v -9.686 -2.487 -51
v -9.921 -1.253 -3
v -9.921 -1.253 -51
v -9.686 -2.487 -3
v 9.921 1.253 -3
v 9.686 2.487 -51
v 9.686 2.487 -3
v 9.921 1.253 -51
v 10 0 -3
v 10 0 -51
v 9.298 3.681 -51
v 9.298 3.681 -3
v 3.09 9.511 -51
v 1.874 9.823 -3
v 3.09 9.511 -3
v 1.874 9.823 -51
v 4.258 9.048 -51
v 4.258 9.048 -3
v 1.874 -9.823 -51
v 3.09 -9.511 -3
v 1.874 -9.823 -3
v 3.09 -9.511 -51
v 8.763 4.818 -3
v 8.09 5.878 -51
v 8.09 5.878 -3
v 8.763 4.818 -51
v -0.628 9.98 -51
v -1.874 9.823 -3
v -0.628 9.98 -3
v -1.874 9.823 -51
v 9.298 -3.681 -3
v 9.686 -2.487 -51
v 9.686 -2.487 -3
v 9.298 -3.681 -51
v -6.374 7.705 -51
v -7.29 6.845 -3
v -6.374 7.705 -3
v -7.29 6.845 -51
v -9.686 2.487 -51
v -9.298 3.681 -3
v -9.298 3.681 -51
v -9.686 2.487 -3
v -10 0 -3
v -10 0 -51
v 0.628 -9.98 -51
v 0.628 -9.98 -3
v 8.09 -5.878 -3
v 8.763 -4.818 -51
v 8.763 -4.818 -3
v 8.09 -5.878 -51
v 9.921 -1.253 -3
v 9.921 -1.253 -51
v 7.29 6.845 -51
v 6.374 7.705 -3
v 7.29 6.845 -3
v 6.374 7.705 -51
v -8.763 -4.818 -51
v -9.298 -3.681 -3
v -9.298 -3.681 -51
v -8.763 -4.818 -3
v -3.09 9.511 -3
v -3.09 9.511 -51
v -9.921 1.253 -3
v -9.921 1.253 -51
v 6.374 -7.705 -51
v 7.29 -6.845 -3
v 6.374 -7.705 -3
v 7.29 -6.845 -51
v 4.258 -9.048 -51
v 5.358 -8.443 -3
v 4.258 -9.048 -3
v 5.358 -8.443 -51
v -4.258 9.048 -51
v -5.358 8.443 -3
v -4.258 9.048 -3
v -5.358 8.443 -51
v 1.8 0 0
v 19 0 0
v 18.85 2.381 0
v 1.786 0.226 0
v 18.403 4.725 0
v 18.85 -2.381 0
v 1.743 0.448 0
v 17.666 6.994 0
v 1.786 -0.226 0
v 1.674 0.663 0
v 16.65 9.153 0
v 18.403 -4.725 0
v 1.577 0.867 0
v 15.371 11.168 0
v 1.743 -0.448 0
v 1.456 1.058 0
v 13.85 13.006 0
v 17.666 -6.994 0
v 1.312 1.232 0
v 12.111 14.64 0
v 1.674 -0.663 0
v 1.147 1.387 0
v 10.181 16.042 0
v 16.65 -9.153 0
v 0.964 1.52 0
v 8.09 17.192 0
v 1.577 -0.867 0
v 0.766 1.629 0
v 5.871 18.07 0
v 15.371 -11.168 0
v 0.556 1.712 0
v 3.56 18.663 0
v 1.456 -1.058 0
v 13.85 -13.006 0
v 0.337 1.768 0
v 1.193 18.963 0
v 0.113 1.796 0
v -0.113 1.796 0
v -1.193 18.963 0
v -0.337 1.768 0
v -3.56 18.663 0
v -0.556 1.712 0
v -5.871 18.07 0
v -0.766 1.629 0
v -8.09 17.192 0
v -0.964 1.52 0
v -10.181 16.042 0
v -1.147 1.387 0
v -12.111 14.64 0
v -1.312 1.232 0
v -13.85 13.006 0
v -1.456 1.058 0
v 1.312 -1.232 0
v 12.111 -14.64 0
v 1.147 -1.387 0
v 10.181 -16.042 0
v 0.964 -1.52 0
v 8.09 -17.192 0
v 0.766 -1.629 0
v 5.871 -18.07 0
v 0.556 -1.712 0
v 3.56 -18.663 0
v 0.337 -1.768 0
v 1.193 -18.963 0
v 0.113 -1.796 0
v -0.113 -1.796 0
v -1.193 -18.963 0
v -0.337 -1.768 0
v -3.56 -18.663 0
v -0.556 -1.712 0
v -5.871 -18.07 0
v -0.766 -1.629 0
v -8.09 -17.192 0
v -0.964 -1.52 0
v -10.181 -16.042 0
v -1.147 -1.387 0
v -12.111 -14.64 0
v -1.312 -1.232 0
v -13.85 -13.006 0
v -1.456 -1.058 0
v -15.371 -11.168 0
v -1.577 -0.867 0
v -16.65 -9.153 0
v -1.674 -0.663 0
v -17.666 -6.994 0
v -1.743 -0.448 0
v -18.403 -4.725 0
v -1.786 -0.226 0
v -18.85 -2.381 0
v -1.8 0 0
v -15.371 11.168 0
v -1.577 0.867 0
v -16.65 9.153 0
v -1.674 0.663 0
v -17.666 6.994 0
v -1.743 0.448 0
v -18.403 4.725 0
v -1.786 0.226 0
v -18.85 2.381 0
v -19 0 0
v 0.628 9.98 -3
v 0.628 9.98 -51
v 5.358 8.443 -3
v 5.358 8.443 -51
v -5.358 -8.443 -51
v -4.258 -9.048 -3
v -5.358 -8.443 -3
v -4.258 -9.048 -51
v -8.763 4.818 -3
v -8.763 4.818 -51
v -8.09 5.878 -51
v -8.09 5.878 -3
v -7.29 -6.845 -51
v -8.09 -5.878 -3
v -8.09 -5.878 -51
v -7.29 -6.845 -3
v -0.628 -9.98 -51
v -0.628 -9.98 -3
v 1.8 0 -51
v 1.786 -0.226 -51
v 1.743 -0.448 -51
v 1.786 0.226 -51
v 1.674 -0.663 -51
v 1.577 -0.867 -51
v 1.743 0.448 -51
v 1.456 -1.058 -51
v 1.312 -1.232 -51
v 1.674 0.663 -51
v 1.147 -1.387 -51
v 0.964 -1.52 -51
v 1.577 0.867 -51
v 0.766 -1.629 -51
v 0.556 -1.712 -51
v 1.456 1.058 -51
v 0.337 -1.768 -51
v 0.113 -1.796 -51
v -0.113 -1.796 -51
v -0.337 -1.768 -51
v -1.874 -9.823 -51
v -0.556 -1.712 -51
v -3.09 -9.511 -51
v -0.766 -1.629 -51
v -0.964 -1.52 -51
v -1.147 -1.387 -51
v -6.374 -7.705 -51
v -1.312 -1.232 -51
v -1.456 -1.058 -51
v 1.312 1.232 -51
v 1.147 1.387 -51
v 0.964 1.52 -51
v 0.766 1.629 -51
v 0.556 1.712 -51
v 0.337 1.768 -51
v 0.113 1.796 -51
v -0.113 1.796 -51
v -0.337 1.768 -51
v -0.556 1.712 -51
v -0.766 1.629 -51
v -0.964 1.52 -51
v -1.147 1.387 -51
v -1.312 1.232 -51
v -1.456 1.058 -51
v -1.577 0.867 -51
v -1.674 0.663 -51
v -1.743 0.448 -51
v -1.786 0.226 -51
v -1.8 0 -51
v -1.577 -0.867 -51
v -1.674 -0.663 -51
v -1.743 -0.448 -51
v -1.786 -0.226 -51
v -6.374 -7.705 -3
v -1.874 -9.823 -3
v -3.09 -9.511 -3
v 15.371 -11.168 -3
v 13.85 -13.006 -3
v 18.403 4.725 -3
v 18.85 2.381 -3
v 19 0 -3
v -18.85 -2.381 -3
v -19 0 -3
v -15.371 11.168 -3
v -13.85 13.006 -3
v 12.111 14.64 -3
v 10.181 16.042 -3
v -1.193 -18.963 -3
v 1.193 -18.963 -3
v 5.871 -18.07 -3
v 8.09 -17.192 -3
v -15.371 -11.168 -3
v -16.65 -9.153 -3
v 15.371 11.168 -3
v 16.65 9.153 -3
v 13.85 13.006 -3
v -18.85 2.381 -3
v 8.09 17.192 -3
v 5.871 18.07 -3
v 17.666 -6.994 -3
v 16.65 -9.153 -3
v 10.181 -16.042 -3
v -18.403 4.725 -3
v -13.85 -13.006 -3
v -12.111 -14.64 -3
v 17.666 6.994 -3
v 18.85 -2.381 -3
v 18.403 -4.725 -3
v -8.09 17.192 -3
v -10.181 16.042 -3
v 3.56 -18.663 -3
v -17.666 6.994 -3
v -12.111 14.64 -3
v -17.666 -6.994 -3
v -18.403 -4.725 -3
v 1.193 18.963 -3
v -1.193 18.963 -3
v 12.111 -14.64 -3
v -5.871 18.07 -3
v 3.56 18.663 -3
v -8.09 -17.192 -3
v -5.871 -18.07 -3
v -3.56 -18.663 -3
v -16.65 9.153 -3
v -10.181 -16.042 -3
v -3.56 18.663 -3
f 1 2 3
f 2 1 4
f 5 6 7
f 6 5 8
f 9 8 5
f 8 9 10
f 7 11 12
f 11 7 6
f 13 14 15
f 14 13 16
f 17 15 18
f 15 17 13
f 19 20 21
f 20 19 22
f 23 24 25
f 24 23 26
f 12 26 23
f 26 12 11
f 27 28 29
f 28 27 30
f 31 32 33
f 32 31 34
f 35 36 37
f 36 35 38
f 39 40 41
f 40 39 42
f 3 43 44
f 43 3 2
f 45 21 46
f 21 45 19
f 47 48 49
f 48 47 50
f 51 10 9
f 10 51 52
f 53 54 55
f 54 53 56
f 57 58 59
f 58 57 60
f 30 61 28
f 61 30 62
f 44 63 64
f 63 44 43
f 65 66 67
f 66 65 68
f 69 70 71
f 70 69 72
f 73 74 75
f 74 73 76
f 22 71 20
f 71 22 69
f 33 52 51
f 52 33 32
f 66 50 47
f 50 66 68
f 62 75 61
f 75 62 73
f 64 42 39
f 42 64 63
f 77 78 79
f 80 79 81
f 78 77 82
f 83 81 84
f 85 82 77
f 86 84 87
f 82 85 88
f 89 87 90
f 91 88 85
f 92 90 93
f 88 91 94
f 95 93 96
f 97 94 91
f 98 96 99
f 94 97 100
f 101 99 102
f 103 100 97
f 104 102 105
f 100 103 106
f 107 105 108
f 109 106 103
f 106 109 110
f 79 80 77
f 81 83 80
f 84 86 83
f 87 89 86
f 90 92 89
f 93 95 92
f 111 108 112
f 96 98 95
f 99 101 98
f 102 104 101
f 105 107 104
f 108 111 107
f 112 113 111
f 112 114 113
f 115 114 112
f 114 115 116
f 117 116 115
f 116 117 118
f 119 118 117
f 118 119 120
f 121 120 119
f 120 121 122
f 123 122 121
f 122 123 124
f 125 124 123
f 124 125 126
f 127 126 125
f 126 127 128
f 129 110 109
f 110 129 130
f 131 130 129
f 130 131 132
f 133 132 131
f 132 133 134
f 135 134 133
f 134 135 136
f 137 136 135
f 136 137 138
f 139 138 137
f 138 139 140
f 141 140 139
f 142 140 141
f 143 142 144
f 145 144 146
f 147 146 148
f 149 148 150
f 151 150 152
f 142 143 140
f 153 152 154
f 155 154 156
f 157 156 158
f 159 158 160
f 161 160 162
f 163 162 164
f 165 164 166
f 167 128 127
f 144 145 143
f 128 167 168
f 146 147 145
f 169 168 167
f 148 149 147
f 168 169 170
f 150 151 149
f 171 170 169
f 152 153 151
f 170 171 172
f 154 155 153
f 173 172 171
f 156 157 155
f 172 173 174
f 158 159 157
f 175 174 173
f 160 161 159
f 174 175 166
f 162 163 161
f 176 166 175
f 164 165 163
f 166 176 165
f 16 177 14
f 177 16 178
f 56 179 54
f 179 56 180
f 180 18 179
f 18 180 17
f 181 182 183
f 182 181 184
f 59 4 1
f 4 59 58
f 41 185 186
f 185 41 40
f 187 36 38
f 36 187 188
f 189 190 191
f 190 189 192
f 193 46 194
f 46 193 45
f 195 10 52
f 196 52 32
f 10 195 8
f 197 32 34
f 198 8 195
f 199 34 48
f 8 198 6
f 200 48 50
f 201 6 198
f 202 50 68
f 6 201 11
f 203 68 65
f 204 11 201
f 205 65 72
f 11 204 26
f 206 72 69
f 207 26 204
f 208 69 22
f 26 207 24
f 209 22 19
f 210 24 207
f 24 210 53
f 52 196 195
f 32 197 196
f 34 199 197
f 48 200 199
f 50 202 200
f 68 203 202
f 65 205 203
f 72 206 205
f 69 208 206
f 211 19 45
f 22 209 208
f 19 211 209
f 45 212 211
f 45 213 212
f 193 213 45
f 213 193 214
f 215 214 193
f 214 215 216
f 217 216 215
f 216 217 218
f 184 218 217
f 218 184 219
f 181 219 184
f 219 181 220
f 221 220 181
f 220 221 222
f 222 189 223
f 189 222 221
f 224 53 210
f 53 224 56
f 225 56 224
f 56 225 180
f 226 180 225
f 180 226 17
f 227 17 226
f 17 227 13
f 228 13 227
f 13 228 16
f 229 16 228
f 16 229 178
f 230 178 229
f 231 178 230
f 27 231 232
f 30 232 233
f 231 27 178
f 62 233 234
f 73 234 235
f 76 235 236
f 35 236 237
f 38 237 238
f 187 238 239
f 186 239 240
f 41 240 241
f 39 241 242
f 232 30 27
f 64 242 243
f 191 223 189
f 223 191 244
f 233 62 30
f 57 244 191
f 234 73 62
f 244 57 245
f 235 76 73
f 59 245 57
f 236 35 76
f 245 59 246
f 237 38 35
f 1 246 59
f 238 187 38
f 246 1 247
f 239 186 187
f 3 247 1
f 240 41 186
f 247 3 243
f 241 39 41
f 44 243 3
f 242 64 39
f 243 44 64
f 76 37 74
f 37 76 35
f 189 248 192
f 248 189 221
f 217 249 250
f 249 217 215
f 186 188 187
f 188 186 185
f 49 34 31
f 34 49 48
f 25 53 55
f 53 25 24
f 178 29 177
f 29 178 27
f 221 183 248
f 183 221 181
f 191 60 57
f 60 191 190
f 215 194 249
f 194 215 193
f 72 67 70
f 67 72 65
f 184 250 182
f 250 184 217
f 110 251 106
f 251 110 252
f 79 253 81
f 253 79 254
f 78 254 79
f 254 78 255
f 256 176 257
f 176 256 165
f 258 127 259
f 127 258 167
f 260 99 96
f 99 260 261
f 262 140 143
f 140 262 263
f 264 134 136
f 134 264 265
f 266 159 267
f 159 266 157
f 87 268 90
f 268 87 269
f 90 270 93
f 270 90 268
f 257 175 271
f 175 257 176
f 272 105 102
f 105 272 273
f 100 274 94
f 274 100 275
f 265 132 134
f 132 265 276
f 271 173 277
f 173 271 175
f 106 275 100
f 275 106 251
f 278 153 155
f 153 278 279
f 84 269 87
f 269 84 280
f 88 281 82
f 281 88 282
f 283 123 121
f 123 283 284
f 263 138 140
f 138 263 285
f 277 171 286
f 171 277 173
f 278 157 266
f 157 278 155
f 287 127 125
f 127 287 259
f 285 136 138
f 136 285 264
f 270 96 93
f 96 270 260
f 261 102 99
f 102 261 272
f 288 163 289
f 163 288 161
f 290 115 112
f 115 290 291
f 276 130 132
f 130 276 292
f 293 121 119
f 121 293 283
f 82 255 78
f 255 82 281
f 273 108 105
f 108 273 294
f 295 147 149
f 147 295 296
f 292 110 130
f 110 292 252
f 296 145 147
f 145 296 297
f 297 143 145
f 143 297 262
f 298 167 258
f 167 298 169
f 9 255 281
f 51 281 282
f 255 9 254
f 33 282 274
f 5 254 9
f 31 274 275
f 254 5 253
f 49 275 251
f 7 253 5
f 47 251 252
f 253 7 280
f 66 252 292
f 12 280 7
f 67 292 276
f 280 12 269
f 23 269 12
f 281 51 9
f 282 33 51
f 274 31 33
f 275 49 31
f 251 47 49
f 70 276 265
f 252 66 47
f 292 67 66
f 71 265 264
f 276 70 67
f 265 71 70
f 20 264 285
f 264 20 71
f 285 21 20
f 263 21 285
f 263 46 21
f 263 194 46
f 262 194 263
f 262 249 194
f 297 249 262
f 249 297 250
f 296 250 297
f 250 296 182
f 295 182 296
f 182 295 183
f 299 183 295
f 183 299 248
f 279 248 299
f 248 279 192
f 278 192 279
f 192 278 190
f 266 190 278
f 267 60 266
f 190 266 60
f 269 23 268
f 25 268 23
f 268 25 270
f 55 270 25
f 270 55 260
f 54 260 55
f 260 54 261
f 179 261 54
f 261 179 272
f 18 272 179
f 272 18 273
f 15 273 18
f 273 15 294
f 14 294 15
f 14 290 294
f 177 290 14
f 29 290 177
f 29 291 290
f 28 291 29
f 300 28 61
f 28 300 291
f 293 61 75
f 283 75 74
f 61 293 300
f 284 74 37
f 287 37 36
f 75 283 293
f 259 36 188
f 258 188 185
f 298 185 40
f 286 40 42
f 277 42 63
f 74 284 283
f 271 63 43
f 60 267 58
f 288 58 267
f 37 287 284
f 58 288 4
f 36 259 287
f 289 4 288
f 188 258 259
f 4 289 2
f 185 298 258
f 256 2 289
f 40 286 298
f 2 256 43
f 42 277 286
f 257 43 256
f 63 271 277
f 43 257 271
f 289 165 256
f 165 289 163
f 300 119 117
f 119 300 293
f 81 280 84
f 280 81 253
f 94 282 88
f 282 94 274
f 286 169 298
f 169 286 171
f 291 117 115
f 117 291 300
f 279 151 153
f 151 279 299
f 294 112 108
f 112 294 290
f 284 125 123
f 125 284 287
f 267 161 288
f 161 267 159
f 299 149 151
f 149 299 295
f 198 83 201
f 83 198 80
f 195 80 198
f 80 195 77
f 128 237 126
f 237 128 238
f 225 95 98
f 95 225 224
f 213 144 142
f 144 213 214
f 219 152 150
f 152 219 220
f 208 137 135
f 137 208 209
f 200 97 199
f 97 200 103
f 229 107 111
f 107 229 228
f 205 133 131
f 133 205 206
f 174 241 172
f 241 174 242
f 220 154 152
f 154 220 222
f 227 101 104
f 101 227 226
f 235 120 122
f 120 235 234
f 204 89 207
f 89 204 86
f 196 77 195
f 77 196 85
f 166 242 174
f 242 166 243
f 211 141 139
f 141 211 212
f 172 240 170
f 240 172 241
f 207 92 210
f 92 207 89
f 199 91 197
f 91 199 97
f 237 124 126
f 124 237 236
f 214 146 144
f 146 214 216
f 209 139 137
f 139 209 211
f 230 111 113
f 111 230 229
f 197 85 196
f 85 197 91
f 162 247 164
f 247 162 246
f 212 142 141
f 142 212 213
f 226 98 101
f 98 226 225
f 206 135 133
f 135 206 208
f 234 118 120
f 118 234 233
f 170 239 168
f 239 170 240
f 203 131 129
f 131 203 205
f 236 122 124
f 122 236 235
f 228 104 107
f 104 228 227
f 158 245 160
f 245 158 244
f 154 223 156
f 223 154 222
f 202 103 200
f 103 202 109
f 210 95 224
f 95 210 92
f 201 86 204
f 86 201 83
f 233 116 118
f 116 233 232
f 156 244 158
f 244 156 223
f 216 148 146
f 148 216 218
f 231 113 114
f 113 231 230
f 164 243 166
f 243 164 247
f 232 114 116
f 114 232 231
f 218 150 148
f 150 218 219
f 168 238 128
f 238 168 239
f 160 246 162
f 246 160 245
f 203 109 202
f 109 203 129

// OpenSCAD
$fn = 50;


difference() {
	union() {
		translate(v = [0, 0, -51.0000000000]) {
			cylinder(h = 51, r = 10.0000000000);
		}
		translate(v = [0, 0, -3.0000000000]) {
			cylinder(h = 3, r = 19.0000000000);
		}
	}
	union() {
		#translate(v = [0, 0, -51]) {
			cylinder(h = 51, r = 1.8000000000);
		}
	}
}
